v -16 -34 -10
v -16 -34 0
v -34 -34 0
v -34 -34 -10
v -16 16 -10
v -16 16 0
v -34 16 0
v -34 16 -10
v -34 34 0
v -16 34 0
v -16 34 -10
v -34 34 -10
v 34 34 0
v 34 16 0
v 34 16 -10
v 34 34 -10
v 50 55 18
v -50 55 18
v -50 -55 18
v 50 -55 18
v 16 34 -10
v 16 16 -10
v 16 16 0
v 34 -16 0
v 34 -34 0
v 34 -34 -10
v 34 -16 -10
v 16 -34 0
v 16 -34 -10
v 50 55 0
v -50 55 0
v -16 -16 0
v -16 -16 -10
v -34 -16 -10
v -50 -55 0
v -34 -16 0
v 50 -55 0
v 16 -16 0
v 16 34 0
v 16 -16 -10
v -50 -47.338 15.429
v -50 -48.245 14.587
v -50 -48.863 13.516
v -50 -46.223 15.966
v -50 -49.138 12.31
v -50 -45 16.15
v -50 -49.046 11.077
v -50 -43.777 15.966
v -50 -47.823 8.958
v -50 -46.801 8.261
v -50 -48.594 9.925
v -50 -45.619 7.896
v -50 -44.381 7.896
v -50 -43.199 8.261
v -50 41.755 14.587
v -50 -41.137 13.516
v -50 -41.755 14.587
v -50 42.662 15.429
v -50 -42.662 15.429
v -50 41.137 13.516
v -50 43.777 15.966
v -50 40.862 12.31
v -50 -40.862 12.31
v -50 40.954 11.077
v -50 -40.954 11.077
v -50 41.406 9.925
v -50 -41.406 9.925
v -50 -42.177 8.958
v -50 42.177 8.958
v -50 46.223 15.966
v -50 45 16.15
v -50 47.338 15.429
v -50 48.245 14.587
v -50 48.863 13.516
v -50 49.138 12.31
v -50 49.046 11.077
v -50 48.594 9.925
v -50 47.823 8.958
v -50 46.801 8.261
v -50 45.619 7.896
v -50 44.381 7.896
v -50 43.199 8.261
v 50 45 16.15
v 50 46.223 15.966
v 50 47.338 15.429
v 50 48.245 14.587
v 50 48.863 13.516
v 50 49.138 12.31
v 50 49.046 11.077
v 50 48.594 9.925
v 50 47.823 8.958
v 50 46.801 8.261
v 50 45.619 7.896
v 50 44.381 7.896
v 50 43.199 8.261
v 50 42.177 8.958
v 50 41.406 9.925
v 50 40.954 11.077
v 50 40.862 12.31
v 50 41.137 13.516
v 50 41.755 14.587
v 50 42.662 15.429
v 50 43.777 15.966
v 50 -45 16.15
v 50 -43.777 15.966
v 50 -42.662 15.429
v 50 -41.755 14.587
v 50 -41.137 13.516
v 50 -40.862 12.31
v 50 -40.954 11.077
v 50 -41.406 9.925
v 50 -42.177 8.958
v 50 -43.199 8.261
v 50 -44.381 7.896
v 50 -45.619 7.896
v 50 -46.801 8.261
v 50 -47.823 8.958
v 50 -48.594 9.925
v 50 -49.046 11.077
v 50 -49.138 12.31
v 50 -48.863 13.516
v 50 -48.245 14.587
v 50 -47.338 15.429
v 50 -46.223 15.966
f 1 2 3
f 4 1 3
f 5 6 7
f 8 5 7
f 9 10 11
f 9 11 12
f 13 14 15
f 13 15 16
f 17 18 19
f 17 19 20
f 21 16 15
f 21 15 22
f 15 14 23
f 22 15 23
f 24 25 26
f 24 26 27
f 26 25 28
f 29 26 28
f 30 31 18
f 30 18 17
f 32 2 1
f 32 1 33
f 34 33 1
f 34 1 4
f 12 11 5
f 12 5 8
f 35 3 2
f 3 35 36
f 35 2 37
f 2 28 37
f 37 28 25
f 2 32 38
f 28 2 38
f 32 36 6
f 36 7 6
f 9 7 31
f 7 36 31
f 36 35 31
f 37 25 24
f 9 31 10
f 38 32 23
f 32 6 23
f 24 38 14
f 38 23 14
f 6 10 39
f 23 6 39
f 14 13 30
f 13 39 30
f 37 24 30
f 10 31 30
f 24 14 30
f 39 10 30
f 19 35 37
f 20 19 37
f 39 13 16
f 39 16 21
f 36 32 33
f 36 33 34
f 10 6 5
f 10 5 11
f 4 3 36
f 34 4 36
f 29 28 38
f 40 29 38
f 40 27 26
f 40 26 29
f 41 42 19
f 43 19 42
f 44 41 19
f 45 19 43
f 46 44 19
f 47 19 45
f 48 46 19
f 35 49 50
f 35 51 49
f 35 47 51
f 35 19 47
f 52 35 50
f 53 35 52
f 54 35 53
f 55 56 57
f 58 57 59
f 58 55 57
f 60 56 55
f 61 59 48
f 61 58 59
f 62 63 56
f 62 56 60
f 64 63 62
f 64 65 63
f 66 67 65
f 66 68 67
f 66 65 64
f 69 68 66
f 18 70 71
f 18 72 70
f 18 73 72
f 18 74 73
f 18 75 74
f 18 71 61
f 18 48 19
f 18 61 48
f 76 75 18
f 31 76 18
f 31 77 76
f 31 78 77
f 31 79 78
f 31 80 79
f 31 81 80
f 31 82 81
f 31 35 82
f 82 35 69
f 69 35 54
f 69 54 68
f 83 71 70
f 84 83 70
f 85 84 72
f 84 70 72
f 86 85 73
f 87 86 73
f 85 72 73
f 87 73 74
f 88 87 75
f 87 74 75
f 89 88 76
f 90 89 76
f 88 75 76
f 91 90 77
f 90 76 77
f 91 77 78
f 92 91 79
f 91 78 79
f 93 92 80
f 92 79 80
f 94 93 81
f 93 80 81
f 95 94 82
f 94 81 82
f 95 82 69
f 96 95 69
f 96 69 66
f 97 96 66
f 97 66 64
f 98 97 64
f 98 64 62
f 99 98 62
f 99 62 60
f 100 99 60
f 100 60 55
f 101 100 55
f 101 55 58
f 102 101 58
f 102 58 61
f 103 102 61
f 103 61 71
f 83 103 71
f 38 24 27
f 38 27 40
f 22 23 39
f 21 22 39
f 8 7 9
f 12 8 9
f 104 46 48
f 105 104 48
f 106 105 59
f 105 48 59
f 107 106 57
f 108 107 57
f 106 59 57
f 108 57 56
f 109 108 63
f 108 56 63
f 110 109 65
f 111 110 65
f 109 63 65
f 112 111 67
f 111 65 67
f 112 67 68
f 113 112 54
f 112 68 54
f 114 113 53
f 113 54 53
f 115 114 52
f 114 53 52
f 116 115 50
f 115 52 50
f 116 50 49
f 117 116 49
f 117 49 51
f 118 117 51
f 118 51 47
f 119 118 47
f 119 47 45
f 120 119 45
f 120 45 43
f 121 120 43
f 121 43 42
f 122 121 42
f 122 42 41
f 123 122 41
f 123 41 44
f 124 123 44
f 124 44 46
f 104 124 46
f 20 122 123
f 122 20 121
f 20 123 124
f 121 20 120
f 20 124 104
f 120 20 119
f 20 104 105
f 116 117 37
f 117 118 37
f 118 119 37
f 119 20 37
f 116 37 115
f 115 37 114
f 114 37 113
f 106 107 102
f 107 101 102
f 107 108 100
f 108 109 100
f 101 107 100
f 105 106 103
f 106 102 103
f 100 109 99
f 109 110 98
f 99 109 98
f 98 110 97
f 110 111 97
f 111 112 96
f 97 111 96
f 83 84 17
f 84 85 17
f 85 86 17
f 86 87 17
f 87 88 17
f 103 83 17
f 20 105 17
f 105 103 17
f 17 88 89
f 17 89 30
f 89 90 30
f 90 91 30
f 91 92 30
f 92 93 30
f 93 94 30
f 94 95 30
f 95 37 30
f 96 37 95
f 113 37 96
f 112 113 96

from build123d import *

# Parameters (mm, degrees)
ESBO_O1_W                = 100
ESBO_O1_H                = 110
RESSALTO_EXTRUS_O1_DEPTH = 18
ESBO_O2_W                = 18
ESBO_O2_H                = 18
RESSALTO_EXTRUS_O2_DEPTH = 10
ESBO_O3_R                = 4.15
CORTE_EXTRUS_O1_DEPTH    = 101


with BuildPart() as part:
    # Esboço1 → Ressalto-extrusão1 (new body)
    with BuildSketch(Plane.XY):
        Rectangle(ESBO_O1_W, ESBO_O1_H)
    extrude(amount=RESSALTO_EXTRUS_O1_DEPTH)

    # Esboço2 → Ressalto-extrusão2 (add)
    with BuildSketch(Plane(origin=(0, 0, 0), x_dir=(-1, 0, 0), z_dir=(0, 0, -1))):
        with Locations((-25, -25)):
            Rectangle(ESBO_O2_W, ESBO_O2_H)
        with Locations((25, -25)):
            Rectangle(ESBO_O2_W, ESBO_O2_H)
        with Locations((-25, 25)):
            Rectangle(ESBO_O2_W, ESBO_O2_H)
        with Locations((25, 25)):
            Rectangle(ESBO_O2_W, ESBO_O2_H)
    extrude(amount=RESSALTO_EXTRUS_O2_DEPTH)

    # Esboço3 → Corte-extrusão1 (cut, through all)
    with BuildSketch(Plane.ZY.offset(50)):
        with Locations((12, 45)):
            Circle(ESBO_O3_R)
        with Locations((12, -45)):
            Circle(ESBO_O3_R)
    extrude(amount=-CORTE_EXTRUS_O1_DEPTH, mode=Mode.SUBTRACT)


solid = part.part
